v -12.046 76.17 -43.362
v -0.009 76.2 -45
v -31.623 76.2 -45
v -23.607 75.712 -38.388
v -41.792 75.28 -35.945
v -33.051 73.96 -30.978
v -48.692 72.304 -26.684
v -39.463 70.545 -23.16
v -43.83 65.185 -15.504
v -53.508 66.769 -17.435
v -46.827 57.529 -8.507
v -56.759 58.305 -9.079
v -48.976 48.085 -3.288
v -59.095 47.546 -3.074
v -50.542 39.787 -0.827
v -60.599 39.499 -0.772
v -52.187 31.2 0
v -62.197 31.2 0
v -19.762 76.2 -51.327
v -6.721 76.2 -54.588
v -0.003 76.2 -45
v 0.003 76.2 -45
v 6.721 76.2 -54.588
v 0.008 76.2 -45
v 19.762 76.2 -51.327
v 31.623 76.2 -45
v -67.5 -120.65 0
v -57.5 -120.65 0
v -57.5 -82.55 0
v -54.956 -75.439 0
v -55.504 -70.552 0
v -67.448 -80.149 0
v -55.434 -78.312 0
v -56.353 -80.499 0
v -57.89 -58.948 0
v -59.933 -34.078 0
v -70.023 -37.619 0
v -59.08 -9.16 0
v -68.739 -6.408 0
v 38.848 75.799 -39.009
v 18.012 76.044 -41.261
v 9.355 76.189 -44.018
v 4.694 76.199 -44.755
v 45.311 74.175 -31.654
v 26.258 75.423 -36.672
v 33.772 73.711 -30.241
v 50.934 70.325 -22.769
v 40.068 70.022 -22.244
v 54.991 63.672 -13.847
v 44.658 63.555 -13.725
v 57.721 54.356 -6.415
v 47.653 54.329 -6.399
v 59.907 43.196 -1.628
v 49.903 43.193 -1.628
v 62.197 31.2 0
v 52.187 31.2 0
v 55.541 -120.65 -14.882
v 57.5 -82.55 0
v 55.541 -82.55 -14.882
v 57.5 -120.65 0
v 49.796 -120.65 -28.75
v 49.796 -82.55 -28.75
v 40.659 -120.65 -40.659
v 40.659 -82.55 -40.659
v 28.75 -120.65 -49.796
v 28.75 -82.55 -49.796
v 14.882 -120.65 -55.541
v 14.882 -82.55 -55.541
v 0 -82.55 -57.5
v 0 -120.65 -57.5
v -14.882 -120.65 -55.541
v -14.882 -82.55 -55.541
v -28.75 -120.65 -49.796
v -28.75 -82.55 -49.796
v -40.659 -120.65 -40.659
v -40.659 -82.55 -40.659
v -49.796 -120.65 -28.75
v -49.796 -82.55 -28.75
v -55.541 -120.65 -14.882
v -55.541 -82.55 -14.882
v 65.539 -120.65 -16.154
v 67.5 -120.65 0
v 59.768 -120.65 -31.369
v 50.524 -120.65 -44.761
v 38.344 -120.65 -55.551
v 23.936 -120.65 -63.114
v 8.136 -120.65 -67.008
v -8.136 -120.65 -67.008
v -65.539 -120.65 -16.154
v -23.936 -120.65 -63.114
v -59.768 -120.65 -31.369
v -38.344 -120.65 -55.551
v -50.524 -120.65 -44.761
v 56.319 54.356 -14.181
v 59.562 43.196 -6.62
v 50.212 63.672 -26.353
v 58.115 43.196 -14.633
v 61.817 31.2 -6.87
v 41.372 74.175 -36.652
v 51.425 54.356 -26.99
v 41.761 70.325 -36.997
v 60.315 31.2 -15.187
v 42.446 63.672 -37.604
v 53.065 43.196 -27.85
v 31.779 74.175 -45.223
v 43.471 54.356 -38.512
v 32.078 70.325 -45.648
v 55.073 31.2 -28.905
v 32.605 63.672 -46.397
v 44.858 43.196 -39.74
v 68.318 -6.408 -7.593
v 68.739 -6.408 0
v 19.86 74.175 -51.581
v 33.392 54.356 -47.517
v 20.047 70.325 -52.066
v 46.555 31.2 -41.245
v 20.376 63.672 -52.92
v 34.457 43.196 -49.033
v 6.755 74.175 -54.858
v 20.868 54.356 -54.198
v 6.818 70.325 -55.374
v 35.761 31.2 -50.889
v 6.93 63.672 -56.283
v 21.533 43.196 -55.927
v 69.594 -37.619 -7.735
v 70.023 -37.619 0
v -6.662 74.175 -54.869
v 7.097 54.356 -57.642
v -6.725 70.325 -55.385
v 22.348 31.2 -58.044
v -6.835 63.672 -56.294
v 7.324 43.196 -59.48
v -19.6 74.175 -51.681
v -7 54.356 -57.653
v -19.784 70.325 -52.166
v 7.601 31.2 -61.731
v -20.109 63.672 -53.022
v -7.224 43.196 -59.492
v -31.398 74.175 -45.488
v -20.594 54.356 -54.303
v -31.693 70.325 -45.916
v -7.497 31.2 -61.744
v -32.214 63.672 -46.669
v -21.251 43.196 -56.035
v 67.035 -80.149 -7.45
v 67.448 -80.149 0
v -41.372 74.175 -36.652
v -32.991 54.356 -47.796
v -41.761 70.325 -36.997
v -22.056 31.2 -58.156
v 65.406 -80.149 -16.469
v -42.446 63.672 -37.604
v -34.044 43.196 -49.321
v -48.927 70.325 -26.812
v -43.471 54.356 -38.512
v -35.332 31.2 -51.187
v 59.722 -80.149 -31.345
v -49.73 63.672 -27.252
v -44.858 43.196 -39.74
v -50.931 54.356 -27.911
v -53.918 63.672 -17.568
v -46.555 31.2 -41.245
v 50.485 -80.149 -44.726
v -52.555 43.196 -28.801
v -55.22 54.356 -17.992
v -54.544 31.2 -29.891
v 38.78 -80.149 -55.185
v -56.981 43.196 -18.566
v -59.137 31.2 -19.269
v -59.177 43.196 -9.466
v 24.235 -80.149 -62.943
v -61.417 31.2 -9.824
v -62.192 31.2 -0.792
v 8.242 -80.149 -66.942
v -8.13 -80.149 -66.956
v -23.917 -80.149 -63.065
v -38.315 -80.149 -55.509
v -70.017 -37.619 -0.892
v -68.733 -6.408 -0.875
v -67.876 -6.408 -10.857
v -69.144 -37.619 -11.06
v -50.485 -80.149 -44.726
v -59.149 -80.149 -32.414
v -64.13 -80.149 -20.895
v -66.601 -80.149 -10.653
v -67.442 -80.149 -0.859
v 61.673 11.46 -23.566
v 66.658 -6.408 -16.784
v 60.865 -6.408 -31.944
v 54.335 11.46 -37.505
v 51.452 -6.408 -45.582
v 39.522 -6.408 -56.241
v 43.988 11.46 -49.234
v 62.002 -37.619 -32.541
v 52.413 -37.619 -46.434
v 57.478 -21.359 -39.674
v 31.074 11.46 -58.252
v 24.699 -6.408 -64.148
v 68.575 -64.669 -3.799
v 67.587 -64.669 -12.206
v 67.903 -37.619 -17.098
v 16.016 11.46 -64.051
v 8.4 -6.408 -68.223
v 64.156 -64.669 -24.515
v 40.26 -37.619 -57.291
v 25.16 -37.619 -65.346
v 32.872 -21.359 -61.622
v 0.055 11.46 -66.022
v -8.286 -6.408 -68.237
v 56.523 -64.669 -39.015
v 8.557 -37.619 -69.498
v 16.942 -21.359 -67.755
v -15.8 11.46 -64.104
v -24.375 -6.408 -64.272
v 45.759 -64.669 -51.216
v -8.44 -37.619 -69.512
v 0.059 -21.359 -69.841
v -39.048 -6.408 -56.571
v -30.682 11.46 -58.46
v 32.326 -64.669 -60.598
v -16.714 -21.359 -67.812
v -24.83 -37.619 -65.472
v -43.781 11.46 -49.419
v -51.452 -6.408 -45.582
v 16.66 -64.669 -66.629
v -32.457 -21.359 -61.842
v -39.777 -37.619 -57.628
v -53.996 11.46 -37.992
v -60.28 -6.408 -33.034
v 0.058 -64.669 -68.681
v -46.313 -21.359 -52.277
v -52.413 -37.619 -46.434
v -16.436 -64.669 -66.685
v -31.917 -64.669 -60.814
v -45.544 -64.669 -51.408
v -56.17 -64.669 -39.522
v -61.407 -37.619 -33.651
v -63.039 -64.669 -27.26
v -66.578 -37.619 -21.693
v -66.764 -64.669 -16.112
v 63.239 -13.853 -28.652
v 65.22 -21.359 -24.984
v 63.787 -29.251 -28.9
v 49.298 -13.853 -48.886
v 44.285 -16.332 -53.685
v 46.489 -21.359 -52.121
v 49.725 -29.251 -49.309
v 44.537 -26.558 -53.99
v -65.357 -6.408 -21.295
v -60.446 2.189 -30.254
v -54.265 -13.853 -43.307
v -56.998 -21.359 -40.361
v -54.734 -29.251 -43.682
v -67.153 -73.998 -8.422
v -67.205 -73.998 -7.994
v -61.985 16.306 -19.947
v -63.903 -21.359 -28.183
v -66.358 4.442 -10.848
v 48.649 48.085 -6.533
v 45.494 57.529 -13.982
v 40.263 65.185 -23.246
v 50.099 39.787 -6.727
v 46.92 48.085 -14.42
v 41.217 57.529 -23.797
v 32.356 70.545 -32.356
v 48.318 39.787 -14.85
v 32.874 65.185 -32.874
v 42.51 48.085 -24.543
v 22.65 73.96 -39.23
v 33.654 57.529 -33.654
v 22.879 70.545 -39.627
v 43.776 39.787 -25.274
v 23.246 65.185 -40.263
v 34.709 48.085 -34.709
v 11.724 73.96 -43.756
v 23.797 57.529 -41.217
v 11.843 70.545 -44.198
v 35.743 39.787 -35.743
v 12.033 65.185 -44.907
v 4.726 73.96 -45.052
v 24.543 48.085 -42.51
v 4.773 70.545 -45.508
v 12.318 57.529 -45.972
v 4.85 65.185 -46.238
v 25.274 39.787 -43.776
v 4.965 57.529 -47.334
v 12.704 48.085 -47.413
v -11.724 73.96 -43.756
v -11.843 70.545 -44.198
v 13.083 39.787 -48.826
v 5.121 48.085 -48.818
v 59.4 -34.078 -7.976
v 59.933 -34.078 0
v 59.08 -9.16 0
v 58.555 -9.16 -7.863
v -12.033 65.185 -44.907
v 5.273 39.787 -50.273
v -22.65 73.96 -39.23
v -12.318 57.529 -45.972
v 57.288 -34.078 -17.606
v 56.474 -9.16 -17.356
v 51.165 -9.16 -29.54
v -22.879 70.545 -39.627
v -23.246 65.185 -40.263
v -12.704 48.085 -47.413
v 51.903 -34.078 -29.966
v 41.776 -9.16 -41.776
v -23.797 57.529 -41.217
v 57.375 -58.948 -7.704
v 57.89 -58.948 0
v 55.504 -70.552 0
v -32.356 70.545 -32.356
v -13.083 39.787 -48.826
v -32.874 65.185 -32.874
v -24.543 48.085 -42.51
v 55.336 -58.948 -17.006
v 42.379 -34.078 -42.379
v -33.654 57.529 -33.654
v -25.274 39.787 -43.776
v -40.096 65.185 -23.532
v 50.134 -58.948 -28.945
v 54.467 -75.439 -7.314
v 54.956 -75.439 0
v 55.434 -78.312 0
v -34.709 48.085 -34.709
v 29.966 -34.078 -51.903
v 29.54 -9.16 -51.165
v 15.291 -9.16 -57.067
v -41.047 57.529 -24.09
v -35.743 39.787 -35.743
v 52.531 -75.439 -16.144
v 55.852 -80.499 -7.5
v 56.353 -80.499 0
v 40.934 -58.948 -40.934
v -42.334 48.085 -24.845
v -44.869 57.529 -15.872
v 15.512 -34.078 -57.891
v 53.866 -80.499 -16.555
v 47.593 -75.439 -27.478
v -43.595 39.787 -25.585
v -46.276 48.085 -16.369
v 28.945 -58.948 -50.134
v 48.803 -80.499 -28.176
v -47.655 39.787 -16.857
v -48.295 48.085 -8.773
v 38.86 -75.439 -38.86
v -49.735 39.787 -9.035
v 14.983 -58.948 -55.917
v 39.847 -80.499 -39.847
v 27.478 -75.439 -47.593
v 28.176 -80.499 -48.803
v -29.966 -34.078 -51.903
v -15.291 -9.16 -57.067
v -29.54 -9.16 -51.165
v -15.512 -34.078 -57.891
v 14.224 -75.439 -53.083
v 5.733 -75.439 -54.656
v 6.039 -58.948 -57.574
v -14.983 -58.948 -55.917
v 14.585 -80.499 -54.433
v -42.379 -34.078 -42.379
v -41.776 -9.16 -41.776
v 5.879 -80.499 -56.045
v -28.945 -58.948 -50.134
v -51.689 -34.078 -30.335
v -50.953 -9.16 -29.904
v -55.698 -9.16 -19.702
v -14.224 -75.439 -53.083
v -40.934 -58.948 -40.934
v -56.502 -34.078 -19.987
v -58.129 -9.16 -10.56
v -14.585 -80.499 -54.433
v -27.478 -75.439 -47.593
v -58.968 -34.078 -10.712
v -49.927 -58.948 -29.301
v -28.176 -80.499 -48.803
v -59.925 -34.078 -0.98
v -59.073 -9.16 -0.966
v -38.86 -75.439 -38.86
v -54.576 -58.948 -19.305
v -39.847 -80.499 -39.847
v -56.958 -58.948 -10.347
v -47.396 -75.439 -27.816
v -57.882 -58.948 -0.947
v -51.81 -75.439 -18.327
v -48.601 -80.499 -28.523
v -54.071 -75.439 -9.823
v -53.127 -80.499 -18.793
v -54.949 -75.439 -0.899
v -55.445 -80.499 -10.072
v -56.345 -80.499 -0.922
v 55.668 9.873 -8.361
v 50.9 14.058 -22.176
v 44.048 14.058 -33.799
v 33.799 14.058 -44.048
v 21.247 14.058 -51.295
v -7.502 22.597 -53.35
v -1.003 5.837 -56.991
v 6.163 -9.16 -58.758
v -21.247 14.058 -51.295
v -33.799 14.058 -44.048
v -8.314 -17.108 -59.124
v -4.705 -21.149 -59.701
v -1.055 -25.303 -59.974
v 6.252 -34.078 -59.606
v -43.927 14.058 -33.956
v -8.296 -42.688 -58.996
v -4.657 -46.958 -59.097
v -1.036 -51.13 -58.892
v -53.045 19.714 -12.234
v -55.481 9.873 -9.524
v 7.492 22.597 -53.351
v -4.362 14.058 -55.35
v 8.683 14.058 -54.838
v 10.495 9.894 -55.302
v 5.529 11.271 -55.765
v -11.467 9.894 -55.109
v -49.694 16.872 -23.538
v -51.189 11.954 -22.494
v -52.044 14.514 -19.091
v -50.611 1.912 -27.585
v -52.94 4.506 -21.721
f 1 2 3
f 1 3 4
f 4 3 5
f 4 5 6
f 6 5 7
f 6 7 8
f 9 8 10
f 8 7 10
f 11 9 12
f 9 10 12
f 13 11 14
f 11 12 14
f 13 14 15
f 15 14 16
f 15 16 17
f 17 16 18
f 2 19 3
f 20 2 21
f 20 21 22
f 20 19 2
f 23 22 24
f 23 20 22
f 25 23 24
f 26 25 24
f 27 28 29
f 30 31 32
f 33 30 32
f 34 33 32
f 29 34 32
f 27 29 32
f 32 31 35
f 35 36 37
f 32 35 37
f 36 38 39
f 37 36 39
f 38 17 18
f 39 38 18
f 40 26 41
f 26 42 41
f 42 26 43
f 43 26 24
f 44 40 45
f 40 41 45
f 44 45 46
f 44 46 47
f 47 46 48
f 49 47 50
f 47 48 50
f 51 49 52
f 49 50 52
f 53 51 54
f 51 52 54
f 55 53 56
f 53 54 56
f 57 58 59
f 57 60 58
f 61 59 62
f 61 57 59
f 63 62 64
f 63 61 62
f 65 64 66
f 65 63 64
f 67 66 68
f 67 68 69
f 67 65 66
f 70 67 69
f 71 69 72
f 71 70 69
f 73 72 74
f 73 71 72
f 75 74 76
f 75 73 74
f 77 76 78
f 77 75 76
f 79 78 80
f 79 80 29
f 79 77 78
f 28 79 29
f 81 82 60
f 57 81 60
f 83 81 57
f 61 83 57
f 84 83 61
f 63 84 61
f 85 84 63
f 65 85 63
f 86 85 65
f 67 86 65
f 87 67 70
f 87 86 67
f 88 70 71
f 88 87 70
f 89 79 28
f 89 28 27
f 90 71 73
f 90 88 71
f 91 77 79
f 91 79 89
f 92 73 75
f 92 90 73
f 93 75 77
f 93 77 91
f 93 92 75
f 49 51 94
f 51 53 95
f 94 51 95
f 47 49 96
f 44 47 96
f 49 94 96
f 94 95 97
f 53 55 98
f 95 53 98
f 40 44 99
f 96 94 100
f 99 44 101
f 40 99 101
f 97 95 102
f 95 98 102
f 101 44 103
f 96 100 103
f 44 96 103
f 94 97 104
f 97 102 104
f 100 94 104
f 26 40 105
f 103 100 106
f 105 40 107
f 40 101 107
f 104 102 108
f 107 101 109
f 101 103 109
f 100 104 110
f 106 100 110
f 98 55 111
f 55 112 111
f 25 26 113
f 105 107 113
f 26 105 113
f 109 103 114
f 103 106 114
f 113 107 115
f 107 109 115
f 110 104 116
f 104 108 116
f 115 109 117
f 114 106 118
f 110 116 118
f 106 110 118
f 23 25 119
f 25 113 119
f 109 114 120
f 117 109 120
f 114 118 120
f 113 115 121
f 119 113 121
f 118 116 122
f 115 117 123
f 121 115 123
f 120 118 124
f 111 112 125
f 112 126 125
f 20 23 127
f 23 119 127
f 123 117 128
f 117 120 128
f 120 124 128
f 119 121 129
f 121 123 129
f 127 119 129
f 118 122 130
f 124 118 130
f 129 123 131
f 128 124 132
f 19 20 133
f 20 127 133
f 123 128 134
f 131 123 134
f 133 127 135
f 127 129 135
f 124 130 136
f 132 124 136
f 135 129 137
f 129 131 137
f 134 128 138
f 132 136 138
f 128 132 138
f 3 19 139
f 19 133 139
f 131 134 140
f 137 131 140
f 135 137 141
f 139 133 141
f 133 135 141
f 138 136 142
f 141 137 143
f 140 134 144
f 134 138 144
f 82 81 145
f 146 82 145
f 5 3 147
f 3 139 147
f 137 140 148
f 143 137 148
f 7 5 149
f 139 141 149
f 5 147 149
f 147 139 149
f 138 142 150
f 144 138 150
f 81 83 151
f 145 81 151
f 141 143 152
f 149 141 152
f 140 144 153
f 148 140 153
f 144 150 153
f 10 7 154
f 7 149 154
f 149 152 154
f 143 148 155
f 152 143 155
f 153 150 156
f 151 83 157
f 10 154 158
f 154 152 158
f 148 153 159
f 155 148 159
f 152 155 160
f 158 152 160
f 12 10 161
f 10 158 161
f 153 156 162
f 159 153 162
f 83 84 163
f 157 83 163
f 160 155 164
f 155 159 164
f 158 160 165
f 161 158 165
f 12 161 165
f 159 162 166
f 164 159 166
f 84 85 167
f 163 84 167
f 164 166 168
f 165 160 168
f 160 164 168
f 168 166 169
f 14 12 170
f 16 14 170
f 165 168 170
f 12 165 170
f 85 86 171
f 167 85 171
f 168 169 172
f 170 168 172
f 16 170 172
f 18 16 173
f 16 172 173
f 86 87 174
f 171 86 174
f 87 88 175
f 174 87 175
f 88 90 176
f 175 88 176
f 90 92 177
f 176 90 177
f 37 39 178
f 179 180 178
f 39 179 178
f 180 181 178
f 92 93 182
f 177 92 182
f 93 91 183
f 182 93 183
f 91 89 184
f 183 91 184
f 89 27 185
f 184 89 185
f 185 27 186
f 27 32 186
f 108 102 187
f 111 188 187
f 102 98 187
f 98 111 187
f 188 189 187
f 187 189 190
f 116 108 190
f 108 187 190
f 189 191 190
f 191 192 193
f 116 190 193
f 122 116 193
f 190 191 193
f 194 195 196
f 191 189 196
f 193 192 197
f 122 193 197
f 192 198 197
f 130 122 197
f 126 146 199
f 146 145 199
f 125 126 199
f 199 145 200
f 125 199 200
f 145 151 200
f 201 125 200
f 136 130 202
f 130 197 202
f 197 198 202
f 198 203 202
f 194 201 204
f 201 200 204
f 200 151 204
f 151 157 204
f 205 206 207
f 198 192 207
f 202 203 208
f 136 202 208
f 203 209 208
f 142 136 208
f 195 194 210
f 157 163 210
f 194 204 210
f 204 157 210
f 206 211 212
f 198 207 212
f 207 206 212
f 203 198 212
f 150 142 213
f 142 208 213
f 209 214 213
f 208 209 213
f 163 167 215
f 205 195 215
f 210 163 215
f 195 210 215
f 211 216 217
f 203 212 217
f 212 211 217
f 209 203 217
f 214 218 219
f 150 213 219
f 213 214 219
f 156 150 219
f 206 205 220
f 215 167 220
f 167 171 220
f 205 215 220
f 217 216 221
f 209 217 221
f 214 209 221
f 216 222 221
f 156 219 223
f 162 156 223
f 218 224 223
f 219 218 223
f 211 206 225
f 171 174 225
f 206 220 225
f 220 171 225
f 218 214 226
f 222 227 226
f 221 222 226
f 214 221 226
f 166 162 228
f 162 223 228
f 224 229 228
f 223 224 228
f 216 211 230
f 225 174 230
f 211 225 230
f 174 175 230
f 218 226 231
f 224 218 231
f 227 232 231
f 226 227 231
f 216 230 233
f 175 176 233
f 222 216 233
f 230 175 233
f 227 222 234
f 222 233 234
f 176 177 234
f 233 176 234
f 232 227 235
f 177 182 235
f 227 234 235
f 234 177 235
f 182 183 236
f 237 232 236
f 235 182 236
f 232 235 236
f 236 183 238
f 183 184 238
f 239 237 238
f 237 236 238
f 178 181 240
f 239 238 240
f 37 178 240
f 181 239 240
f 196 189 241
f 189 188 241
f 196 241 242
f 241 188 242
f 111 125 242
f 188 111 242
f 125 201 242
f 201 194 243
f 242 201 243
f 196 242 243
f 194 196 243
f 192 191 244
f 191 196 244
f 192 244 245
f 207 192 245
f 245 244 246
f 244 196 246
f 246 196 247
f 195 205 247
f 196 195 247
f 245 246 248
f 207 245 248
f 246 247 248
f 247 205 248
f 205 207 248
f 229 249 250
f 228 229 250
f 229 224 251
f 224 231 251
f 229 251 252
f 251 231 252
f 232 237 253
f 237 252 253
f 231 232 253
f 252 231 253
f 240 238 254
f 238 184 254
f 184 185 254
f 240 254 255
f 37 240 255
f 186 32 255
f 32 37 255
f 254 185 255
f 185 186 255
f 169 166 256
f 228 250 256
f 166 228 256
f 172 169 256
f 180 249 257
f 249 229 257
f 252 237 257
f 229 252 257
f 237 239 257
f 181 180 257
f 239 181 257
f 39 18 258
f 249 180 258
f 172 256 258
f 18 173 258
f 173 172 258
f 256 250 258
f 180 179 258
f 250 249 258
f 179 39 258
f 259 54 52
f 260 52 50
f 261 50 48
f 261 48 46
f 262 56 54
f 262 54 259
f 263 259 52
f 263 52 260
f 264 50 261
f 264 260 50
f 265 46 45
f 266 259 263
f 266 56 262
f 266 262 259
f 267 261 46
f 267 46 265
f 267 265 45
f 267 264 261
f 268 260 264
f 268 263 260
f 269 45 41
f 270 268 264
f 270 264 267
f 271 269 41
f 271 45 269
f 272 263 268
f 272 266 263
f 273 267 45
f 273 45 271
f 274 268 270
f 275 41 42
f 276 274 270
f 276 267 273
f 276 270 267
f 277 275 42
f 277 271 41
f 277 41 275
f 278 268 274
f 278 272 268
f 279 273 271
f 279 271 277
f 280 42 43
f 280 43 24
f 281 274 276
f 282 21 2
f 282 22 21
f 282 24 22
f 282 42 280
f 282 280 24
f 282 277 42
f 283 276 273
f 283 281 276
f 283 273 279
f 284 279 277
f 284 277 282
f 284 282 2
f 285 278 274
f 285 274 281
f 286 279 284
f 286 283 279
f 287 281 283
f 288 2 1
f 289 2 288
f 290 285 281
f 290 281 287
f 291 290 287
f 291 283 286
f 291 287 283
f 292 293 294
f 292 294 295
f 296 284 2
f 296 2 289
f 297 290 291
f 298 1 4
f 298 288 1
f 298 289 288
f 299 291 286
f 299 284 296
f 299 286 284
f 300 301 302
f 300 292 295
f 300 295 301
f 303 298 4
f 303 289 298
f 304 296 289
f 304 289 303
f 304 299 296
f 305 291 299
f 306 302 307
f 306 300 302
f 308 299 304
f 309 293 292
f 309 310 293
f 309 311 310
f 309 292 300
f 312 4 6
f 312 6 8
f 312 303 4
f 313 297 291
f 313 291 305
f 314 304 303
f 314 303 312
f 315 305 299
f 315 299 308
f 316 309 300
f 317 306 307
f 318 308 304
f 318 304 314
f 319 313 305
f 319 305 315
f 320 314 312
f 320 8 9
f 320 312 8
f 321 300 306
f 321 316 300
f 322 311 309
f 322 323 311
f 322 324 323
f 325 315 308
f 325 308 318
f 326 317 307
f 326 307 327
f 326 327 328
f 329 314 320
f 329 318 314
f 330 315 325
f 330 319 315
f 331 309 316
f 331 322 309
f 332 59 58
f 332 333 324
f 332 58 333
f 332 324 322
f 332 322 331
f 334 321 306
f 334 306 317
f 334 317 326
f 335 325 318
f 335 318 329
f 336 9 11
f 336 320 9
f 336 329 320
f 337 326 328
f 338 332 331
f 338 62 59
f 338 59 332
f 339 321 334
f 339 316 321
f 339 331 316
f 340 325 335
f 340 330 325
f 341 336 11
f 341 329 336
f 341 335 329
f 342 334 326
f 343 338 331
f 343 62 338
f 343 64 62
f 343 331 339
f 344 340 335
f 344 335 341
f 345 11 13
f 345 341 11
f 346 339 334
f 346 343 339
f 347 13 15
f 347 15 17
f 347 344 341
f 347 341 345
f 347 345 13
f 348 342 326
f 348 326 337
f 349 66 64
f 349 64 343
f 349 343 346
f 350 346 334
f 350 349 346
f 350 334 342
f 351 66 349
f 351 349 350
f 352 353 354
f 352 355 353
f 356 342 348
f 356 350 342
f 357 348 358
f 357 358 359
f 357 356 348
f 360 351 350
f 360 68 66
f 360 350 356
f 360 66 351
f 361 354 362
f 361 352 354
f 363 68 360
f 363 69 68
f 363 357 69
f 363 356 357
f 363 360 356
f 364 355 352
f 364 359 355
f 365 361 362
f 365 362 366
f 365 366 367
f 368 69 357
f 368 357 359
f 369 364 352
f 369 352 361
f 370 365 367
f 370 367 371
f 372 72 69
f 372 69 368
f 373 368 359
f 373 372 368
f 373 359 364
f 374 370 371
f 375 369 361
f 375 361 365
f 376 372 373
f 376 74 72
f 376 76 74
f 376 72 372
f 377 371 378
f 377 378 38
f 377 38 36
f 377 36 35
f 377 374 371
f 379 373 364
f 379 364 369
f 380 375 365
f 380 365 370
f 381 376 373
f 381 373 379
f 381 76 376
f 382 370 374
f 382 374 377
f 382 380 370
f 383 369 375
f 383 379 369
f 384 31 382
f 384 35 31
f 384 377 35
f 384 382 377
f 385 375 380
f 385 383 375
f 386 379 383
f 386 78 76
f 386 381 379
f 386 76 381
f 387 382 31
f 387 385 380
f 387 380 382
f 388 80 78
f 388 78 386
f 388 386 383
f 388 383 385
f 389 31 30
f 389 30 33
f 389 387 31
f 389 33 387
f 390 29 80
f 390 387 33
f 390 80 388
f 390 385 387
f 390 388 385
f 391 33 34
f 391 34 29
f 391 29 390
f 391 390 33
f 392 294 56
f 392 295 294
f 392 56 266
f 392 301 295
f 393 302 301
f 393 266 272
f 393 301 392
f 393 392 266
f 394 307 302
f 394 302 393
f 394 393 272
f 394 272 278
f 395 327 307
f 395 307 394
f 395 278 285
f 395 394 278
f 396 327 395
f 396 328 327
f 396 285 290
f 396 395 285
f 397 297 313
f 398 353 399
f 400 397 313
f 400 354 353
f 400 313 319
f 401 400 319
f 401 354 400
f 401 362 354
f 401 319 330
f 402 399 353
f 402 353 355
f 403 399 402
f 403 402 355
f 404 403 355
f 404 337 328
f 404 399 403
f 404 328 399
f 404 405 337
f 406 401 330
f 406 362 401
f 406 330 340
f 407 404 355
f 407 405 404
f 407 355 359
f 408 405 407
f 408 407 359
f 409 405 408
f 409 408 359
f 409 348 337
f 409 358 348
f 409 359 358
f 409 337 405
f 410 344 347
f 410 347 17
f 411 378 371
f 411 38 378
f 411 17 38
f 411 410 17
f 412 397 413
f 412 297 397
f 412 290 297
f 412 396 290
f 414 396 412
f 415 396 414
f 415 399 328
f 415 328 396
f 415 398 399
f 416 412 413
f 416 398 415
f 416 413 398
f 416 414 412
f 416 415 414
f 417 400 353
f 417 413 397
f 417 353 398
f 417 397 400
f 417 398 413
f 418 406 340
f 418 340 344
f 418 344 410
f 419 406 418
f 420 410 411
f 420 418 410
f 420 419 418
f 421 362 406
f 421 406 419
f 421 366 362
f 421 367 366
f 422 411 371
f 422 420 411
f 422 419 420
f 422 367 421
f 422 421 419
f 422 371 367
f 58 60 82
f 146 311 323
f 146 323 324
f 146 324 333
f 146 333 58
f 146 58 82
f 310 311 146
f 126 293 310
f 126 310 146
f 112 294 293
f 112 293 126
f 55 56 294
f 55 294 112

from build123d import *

# Parameters (mm, degrees)
F1_ANGLE    = 180
F2_T1_DEPTH = 235
F2_T3_DEPTH = 235


# Not quite as in the source:
# - a fillet or chamfer that OpenCascade refuses, or shapes differently, is made with other operations: its cross-section is extruded or revolved along the edge and cut away or added


with BuildPart() as f1:
    # F0 (on Top) → F1 (revolve)
    with BuildSketch(Plane.XY):
        with BuildLine():
            Line((55, 76.2), (45, 76.2))
            add(Edge.make_bspline(
                [(45, 76.2), (46.4314513107, 65.4743240031), (49.4342728448, 42.9745780396), (58.2913617327, 2.5444927944), (60.7679740967, -26.0894301808), (58.7809439185, -60.3358085831), (53.5427275811, -75.7766382868), (56.3670048957, -80.6107385976), (57.5, -82.55)],
                knots=[0, 0, 0, 0, 0.1935302552, 0.4059773556, 0.5886953586, 0.7831392141, 0.9130035116, 1, 1, 1, 1], degree=3))
            Line((57.5, -82.55), (57.5, -120.65))
            Line((57.5, -120.65), (67.5, -120.65))
            add(Edge.make_bspline(
                [(55, 76.2), (56.4448487865, 65.4735496208), (59.4077958305, 42.9708360316), (68.3641601176, 2.5594432328), (70.5377050341, -26.12710406), (69.5737841588, -60.0998956005), (67.2249671963, -76.0618392071), (67.611979836, -82.6108206706), (67.4592693335, -102.3954969726), (67.5036900604, -114.5662351269), (67.5, -120.65)],
                knots=[0, 0, 0, 0, 0.1503921233, 0.3154845037, 0.4574744391, 0.6084055945, 0.7088837212, 0.7740964569, 0.8870482285, 1, 1, 1, 1], degree=3))
        make_face()
    revolve(axis=Axis((0, 0, 0), (0, 1, 0)), revolution_arc=F1_ANGLE)

    # F2: fillet of radius 45 on 2 edges, made by hand

    # F2_s2 → F2_t1 (cut)
    with BuildSketch(Plane.YZ.offset(-67.5)):
        with BuildLine():
            ThreePointArc((76.2, -45), (63.0198051534, -13.1801948466), (31.2, 0))
            Line((31.2, 0), (76.2, 0))
            Line((76.2, 0), (76.2, -45))
        make_face()
    extrude(amount=F2_T1_DEPTH, mode=Mode.SUBTRACT)

    # F2_s4 → F2_t3 (cut)
    with BuildSketch(Plane.YZ.offset(-167.5)):
        with BuildLine():
            ThreePointArc((76.2, -45), (63.0198051534, -13.1801948466), (31.2, 0))
            Line((31.2, 0), (76.2, 0))
            Line((76.2, 0), (76.2, -45))
        make_face()
    extrude(amount=F2_T3_DEPTH, mode=Mode.SUBTRACT)


solid = f1.part
